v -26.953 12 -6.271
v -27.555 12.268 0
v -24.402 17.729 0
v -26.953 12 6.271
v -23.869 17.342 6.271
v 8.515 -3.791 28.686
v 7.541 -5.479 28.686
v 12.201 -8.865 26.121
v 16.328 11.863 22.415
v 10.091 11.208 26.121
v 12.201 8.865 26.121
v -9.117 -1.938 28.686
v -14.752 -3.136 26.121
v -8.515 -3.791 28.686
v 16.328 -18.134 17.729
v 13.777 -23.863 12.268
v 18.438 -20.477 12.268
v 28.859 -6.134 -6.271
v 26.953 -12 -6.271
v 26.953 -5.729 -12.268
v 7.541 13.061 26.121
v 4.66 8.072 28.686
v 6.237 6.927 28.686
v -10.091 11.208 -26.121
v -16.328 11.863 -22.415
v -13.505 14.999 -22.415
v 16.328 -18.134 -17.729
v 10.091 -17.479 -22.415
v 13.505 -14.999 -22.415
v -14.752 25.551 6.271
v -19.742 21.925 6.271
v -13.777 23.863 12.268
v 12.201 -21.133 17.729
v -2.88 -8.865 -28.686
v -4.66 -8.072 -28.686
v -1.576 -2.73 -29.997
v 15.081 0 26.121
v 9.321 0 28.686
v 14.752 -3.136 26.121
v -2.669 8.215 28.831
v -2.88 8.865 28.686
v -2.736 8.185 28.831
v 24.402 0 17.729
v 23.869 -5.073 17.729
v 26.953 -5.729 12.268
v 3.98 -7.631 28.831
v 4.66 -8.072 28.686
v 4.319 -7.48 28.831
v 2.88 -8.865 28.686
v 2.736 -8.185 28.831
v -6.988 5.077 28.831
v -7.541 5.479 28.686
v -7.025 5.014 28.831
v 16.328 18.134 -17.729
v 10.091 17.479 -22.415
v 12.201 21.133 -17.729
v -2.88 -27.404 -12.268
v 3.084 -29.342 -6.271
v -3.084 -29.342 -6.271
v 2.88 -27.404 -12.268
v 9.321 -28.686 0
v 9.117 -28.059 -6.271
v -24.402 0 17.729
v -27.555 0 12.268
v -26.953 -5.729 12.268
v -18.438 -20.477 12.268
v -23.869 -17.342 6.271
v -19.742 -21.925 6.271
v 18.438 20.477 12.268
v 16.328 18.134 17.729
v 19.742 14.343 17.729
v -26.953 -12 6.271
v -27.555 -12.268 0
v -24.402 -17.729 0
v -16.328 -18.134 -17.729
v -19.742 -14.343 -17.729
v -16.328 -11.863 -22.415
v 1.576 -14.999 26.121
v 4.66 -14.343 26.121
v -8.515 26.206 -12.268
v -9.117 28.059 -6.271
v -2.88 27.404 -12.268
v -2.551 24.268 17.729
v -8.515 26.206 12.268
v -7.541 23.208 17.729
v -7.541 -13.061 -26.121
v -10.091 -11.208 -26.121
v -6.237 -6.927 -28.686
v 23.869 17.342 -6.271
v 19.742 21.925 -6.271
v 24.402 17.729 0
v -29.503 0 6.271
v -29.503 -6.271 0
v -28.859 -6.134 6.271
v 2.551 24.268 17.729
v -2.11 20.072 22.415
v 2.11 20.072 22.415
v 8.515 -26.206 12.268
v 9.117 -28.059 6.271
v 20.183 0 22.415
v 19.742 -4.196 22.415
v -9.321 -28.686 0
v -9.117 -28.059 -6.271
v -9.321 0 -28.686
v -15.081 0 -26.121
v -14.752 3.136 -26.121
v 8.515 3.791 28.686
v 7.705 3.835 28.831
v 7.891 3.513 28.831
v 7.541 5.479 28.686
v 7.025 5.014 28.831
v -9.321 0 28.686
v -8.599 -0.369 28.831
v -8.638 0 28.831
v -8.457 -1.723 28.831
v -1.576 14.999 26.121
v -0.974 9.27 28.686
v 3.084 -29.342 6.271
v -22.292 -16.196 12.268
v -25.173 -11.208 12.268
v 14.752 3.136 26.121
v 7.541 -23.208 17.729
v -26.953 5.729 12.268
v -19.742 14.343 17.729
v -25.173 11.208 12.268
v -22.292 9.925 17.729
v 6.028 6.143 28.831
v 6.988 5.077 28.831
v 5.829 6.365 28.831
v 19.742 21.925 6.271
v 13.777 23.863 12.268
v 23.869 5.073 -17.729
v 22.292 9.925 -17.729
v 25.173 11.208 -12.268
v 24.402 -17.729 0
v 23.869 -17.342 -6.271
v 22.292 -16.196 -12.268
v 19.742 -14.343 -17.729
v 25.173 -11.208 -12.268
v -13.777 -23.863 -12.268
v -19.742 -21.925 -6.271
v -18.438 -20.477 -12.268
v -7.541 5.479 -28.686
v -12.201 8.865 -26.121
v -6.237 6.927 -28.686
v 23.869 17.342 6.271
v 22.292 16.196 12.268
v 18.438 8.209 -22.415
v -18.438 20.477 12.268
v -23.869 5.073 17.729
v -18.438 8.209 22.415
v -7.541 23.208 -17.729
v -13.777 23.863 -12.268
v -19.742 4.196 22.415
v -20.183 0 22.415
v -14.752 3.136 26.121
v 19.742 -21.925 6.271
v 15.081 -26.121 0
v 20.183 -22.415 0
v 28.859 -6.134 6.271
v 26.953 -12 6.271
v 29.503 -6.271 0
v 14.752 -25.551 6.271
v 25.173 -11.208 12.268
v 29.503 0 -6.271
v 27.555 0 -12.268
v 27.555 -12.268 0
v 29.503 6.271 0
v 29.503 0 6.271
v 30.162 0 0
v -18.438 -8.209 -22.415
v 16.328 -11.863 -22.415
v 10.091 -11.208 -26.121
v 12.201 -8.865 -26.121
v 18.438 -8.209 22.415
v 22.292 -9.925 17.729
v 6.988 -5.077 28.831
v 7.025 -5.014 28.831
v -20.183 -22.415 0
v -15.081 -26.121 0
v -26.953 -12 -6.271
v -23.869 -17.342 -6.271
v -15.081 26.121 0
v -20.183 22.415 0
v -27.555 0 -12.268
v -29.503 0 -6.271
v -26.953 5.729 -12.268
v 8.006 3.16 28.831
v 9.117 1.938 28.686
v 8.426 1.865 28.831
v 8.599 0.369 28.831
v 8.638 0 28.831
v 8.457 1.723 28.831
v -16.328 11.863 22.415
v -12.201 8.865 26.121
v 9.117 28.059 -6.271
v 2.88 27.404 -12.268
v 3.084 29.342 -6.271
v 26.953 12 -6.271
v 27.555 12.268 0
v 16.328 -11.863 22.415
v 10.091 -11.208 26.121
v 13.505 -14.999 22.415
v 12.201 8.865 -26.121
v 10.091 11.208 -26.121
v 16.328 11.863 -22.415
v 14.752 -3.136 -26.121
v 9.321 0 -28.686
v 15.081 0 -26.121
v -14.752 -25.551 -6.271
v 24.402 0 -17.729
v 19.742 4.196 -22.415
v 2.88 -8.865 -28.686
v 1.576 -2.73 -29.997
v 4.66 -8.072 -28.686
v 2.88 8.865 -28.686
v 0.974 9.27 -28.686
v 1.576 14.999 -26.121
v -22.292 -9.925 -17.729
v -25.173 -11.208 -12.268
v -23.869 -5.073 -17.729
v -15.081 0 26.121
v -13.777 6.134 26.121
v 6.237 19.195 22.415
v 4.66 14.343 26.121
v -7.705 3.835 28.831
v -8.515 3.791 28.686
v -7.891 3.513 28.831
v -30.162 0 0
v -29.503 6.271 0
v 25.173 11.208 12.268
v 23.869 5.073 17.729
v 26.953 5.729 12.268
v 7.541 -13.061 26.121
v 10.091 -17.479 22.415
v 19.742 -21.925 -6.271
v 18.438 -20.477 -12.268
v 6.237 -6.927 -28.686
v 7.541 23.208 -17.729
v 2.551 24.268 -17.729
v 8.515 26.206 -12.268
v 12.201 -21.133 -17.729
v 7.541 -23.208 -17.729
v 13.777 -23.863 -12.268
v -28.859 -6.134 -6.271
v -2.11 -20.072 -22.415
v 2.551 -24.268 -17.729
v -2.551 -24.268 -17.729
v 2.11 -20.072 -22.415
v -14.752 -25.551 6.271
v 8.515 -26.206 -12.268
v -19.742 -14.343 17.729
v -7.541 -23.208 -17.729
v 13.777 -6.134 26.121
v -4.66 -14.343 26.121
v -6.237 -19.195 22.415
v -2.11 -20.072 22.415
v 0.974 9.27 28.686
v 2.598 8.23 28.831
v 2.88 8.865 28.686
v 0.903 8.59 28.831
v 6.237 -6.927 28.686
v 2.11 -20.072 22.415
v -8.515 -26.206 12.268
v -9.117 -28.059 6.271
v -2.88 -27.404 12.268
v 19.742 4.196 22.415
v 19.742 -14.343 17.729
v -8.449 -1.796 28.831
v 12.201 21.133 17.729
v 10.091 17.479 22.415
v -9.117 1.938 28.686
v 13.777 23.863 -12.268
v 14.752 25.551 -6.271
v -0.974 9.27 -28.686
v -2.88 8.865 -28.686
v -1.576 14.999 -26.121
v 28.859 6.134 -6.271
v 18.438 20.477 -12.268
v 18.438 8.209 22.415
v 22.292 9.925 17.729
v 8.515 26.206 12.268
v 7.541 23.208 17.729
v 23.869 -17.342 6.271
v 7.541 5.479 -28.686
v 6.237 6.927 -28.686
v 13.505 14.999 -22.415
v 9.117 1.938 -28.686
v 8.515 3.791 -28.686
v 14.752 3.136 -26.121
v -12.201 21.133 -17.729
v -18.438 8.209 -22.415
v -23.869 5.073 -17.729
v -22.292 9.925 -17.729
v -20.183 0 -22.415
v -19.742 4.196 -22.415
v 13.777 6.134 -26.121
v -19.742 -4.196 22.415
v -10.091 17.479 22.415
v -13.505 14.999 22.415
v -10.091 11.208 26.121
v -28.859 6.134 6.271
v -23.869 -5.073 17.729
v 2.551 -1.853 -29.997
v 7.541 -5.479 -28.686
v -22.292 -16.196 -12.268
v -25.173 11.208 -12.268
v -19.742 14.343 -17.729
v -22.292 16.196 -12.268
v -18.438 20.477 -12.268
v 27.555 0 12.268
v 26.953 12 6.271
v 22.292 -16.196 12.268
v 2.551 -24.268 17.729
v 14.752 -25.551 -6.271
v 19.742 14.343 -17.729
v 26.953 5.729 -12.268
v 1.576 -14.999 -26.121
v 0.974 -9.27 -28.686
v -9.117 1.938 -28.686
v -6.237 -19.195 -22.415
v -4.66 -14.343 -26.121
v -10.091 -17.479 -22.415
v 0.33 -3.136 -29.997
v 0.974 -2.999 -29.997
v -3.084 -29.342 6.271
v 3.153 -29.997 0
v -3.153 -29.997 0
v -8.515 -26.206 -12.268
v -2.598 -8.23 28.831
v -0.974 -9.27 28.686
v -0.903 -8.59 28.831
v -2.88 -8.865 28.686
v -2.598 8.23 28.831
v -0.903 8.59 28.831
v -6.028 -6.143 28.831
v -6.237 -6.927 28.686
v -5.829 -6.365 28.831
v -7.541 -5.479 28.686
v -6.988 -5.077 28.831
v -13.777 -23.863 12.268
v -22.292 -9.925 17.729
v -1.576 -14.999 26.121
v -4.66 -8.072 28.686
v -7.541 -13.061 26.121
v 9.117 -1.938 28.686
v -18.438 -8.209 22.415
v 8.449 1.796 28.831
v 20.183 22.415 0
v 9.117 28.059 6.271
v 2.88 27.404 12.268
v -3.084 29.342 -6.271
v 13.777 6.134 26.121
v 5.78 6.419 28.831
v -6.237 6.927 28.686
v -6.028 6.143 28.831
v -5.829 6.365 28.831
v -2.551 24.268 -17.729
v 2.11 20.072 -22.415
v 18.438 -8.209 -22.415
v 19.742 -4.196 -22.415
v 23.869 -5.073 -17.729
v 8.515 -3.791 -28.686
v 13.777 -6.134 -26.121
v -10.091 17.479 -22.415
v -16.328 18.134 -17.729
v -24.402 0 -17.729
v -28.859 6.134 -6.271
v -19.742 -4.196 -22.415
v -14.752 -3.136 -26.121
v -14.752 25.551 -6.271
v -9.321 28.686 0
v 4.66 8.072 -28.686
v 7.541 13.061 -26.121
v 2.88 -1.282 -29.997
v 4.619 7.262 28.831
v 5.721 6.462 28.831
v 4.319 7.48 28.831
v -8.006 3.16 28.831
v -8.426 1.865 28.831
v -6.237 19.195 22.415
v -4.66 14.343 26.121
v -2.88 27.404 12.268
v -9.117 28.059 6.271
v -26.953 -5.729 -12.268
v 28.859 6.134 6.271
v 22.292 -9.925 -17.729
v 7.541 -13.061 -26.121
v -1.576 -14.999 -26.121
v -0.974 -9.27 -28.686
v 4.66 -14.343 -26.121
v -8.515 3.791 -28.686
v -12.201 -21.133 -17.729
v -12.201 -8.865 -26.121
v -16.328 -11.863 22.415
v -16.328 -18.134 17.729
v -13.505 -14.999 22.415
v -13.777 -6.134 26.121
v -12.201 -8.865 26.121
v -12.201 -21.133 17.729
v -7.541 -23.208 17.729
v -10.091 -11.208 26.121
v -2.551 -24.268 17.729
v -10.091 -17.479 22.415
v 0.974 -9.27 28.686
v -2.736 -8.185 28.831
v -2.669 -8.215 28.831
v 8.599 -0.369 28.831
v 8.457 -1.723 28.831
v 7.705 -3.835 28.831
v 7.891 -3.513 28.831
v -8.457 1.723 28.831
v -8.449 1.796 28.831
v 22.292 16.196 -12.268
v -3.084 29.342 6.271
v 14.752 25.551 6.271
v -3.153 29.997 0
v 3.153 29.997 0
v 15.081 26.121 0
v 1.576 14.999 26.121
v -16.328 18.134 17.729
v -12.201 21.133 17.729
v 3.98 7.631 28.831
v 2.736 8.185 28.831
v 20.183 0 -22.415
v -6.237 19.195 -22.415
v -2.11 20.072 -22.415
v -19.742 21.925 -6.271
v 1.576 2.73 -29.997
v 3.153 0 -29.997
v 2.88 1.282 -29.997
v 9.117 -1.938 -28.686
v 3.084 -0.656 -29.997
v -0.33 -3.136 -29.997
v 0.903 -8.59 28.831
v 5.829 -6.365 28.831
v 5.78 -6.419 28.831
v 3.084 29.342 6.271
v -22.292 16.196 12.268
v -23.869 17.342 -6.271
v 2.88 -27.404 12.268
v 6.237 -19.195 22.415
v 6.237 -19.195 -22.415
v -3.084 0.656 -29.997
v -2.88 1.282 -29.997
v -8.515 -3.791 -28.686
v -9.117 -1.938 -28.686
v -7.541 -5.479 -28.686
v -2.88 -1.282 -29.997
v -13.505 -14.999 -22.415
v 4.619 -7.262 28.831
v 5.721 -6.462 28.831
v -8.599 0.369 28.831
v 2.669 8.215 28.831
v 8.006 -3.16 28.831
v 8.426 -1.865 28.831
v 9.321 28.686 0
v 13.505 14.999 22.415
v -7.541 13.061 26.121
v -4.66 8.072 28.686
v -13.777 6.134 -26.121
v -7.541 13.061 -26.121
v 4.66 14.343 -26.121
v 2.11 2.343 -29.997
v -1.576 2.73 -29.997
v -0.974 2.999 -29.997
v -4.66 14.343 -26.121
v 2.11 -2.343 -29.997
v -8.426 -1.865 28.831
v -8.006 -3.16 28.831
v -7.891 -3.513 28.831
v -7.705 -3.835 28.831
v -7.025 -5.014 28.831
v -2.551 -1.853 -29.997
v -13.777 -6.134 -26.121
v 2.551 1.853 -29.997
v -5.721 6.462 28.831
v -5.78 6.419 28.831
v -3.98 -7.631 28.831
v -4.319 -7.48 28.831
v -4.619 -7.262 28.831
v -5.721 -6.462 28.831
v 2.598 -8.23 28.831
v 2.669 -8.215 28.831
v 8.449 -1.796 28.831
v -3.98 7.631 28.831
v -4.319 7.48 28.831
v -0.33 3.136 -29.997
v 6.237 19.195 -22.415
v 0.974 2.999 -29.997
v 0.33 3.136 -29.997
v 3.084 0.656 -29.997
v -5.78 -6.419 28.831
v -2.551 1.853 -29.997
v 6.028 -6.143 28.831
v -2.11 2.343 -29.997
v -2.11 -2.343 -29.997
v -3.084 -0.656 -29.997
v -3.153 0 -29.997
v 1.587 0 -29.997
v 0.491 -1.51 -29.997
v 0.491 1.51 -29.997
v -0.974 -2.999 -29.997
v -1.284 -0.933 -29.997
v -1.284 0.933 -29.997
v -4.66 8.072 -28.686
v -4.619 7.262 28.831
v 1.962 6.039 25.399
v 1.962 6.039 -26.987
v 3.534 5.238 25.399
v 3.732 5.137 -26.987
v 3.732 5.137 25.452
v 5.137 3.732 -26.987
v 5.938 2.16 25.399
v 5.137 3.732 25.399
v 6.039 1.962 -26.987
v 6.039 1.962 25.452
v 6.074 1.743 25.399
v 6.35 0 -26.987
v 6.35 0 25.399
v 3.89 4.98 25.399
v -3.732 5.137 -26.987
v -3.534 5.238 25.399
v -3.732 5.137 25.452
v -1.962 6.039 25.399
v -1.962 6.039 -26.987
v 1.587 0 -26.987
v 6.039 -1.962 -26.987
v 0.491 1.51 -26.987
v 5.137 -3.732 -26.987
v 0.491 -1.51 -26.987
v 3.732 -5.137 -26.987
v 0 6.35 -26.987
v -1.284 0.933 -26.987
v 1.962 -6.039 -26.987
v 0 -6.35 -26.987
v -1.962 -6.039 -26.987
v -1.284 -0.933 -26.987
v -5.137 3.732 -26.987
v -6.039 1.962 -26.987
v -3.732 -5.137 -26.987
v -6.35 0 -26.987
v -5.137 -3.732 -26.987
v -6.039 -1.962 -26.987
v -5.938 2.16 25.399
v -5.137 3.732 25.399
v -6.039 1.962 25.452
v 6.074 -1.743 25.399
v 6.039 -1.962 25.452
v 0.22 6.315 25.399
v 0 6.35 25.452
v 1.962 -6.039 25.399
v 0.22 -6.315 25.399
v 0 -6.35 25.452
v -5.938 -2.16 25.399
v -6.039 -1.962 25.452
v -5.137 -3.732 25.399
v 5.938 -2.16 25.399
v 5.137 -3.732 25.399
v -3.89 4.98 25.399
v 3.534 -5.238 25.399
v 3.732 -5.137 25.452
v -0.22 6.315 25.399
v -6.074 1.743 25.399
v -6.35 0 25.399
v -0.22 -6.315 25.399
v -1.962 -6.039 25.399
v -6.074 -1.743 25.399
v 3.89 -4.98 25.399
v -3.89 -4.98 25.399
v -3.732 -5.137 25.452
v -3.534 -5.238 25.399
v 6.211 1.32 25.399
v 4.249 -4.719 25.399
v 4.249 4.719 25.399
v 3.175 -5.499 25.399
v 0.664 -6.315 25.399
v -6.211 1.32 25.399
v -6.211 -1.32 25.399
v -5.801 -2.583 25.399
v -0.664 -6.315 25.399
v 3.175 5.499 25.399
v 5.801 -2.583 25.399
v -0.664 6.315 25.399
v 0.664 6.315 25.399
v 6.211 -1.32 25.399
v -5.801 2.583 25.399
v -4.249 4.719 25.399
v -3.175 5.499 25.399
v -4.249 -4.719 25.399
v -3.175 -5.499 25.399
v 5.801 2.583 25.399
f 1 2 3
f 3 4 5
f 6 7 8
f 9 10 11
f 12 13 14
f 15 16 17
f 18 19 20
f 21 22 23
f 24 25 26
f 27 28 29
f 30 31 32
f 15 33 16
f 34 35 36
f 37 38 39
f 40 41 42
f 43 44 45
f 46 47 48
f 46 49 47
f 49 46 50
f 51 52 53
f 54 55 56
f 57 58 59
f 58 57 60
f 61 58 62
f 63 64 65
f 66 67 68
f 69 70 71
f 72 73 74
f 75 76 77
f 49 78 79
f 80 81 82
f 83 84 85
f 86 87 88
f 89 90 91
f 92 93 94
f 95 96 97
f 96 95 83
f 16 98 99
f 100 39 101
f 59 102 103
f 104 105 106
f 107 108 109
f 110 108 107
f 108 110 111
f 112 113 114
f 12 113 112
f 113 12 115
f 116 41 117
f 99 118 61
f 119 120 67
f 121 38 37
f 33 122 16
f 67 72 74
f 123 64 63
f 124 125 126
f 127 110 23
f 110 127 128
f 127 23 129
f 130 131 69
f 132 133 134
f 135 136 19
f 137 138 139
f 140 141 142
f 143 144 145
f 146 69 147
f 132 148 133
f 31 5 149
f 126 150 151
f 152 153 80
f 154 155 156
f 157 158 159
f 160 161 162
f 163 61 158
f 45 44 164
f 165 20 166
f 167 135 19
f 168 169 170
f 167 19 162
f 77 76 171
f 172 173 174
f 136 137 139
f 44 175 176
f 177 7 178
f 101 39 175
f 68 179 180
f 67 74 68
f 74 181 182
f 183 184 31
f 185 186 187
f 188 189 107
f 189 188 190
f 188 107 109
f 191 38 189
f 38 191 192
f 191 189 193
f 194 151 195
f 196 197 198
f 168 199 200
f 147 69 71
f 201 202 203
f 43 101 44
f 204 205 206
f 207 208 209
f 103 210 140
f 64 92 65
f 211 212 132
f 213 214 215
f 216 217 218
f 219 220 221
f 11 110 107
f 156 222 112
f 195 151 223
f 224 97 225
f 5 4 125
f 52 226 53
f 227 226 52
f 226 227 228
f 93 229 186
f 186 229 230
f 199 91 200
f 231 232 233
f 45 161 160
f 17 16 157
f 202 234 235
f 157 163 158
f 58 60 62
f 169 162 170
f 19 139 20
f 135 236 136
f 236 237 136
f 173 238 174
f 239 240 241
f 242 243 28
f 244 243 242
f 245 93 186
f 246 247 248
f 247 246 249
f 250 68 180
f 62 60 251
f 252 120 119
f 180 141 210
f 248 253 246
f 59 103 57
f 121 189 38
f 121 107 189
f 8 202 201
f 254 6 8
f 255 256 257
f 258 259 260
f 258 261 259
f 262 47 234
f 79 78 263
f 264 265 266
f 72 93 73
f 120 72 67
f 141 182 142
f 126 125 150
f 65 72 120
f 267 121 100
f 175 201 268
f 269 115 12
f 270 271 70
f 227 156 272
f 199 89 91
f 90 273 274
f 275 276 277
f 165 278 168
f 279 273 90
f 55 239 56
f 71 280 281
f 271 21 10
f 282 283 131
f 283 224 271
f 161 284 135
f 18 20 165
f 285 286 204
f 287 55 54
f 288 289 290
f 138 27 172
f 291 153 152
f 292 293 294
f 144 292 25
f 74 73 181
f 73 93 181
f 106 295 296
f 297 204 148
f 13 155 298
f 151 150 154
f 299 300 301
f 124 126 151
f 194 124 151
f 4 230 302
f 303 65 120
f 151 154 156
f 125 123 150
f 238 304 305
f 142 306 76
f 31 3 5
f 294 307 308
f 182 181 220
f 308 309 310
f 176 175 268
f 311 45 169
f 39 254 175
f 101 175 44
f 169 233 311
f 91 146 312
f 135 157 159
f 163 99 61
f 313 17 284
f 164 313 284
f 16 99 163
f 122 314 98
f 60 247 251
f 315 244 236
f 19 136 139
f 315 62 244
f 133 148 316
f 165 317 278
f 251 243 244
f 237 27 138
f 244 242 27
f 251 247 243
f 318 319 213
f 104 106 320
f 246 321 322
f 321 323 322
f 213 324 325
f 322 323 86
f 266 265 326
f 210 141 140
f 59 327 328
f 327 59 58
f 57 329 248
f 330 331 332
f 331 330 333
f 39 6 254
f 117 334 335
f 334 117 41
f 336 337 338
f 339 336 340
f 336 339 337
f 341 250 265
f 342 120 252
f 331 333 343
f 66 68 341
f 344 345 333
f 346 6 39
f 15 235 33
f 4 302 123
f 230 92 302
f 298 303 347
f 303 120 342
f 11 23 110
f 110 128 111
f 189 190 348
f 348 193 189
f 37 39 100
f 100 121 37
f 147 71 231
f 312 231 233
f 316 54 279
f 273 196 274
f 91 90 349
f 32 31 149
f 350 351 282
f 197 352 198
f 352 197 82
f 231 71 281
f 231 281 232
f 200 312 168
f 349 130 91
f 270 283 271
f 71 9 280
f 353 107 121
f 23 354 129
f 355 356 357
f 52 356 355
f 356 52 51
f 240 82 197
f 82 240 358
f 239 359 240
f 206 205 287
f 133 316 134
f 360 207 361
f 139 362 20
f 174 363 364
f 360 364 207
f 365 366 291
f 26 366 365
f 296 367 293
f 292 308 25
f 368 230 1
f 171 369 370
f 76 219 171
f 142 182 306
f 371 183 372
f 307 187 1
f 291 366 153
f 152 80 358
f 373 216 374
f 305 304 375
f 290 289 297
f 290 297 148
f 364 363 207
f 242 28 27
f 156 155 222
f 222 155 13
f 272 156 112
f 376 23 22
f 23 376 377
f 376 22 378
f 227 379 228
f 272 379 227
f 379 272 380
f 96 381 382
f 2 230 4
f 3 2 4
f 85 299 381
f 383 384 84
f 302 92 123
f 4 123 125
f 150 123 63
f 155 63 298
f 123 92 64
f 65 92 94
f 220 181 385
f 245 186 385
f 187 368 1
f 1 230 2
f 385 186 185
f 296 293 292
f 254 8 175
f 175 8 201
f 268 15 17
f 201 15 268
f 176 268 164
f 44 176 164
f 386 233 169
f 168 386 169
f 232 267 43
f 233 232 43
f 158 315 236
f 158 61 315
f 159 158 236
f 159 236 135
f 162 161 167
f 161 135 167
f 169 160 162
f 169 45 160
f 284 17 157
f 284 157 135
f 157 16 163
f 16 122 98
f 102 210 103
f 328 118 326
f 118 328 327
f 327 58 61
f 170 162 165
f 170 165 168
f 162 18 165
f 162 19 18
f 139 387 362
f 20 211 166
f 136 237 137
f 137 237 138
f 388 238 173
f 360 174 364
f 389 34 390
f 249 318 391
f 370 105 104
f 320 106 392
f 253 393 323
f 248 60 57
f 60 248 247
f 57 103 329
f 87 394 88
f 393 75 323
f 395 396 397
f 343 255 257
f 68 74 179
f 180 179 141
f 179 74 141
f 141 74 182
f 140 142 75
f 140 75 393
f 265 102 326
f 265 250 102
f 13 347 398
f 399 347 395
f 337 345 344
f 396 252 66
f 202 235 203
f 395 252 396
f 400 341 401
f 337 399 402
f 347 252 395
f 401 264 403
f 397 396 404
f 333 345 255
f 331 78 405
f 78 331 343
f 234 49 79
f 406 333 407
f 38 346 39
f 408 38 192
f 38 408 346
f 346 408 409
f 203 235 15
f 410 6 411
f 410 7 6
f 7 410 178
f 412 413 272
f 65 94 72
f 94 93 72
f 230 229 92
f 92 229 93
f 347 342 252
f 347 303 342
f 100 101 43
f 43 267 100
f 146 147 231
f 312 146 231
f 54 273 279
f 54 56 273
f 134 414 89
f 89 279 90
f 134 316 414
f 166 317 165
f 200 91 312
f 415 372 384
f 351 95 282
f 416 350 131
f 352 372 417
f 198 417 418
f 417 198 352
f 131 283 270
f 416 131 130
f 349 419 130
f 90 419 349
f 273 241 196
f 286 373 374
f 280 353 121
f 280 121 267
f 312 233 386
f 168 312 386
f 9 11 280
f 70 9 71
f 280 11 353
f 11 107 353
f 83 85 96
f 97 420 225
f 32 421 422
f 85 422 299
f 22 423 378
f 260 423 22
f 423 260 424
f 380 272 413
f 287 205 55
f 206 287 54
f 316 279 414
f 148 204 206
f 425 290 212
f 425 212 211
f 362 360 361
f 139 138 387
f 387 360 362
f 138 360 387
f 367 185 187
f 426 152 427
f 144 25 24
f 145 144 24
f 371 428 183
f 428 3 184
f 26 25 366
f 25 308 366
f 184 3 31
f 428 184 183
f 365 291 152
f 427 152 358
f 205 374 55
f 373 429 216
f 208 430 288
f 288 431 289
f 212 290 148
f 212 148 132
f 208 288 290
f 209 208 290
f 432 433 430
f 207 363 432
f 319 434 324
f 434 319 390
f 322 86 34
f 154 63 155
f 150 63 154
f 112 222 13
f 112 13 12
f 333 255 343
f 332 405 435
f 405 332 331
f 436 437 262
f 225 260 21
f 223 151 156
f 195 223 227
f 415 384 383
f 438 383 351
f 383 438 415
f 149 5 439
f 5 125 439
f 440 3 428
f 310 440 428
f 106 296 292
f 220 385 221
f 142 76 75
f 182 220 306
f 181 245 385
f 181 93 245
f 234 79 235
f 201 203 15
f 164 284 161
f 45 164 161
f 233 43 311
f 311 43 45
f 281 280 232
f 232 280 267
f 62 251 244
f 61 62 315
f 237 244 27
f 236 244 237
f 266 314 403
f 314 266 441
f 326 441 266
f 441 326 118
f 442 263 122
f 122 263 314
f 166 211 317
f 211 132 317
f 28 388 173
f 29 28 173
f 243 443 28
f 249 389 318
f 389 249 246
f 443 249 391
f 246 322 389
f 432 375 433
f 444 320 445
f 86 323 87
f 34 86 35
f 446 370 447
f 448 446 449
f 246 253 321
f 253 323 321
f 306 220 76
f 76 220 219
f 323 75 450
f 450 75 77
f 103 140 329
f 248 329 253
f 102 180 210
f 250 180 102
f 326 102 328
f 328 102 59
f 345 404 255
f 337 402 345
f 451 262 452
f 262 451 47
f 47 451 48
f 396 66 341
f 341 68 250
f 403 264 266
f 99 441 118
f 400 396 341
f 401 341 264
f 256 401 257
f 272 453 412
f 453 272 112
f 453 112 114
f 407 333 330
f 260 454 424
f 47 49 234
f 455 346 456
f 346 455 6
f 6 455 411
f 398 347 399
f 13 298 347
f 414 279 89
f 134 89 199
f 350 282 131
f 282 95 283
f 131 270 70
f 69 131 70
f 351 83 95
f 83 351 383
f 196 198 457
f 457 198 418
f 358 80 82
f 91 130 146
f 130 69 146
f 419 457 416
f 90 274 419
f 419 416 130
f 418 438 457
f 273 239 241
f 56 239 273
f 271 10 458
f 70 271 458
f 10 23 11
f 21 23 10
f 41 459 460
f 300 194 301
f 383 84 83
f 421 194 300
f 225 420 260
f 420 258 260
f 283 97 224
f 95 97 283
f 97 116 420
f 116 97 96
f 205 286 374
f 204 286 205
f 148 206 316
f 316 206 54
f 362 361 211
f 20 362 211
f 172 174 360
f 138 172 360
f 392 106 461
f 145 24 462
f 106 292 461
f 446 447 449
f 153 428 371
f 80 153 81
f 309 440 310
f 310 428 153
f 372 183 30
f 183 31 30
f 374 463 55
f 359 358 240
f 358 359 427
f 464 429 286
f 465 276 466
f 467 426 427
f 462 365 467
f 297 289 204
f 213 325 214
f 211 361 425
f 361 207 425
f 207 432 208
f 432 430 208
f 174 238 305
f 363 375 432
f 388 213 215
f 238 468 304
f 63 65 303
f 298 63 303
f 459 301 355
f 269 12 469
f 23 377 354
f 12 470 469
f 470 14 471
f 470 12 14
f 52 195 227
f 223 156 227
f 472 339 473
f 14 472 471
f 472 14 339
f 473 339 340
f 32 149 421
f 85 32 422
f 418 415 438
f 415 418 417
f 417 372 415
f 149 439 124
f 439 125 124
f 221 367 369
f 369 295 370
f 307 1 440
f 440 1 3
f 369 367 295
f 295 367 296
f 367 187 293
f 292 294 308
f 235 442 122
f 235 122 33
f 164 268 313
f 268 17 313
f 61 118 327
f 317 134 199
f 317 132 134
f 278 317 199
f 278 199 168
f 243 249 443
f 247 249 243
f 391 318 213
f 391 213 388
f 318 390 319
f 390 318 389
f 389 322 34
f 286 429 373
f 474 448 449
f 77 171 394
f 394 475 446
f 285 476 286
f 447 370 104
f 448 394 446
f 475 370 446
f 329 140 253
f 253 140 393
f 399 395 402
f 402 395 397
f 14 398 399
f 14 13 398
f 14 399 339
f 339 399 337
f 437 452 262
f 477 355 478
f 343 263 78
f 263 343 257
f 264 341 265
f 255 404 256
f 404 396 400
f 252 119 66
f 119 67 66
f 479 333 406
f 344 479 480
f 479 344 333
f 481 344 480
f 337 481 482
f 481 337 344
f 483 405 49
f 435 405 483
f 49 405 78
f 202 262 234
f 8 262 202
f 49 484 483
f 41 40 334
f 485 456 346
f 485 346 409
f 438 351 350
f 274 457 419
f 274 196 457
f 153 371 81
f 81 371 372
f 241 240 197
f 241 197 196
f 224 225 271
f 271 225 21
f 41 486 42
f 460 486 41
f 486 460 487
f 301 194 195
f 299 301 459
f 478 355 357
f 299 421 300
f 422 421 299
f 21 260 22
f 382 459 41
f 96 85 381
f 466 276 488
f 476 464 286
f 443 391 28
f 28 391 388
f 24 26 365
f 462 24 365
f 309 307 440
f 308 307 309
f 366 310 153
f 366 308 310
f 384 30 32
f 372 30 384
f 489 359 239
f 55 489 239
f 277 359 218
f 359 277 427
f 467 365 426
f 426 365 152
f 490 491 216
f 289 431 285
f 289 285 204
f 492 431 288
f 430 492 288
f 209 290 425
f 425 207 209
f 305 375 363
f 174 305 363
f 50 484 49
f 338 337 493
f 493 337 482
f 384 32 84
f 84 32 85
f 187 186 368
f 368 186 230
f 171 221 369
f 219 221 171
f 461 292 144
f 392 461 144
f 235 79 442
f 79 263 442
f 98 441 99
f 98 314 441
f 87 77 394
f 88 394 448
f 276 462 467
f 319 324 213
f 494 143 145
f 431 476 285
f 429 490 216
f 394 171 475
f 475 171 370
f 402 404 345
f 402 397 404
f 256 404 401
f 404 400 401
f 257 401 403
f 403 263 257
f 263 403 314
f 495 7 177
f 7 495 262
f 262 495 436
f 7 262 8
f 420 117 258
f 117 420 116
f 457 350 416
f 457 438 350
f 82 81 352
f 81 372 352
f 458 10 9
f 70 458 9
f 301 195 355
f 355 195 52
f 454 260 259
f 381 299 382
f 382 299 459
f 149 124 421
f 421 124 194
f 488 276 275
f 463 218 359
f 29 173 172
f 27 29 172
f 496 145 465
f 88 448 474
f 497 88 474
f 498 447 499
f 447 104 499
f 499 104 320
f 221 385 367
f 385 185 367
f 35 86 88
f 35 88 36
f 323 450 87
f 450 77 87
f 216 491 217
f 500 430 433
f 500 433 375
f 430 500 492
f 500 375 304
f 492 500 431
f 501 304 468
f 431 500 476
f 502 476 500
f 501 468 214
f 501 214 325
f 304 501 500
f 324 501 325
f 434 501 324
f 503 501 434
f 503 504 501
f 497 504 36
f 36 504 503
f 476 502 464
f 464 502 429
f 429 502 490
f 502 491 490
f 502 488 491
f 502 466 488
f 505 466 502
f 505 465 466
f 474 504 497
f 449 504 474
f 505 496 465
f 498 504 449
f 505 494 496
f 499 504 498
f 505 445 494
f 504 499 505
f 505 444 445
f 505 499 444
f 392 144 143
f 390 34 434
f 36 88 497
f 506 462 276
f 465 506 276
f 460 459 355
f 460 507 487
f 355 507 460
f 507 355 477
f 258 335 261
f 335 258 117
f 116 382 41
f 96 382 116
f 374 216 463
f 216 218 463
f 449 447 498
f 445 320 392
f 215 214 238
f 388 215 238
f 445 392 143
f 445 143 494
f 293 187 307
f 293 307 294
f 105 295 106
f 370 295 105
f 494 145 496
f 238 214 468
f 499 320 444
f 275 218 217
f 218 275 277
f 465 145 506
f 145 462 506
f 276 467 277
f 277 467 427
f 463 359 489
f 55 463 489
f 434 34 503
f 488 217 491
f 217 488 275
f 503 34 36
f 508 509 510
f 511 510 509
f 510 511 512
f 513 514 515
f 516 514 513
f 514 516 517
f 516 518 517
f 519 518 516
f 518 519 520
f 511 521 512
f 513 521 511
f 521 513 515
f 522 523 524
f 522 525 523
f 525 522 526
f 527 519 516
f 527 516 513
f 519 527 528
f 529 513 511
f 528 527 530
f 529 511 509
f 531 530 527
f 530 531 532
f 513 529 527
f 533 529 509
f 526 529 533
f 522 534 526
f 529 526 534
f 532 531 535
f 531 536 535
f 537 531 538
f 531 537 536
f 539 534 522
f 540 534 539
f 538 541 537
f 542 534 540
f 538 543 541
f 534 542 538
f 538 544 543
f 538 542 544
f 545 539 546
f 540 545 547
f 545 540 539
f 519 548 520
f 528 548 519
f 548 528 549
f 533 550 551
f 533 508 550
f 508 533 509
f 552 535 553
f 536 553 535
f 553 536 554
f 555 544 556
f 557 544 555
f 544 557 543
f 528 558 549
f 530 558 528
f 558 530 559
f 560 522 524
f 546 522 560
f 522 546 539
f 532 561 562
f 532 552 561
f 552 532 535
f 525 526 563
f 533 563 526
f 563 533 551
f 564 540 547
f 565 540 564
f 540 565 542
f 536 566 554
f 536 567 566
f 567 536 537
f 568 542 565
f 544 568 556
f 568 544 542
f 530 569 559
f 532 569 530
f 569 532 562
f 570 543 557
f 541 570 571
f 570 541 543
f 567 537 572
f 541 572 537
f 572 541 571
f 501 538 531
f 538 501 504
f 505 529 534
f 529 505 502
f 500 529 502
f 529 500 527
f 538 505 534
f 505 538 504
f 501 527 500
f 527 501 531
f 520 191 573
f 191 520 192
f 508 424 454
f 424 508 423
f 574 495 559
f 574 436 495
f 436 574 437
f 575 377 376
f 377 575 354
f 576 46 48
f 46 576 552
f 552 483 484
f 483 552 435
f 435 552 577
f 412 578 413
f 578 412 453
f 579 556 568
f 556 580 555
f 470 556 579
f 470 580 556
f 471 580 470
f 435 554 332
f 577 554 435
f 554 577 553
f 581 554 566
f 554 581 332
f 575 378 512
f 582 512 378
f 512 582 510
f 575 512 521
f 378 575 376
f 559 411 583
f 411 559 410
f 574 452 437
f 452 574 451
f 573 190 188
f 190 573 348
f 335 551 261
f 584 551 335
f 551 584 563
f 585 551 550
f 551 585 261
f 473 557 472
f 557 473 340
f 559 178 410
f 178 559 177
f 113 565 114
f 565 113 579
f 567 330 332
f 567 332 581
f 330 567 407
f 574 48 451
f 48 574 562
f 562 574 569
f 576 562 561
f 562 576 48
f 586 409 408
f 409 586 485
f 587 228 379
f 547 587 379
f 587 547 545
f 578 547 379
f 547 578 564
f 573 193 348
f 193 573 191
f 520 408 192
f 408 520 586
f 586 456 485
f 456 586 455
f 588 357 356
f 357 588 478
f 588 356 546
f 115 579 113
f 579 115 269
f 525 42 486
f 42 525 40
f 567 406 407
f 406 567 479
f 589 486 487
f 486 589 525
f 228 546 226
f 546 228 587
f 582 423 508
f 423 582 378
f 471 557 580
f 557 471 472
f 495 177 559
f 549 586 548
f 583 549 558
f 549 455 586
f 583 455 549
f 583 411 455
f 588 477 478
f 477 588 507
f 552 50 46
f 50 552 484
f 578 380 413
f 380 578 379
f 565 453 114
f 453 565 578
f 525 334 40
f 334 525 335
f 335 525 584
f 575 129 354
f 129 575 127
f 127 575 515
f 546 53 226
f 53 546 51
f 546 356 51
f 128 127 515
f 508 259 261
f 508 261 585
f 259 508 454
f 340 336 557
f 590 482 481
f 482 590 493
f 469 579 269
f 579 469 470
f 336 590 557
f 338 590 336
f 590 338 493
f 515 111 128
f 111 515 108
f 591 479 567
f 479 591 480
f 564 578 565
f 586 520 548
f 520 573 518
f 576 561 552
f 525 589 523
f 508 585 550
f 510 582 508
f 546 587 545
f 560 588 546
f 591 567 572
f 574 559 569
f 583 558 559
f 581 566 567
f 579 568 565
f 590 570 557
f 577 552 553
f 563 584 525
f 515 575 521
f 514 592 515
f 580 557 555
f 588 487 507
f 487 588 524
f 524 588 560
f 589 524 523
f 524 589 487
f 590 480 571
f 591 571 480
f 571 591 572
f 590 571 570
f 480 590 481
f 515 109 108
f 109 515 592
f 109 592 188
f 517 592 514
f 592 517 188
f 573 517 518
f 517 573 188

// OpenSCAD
//ball module
module tama(){
    
    // radius of the ball
    radius = 60.325/2;
    difference(){
        sphere(radius);
        translate([0,0,-26.9875]) cylinder(h = 60.325, r = 12.7/2);
        translate([0,0,-35]) cylinder(h = 70, r = 3.175/2);
        
        translate([0,0, 25.3995]) cylinder(h = 4.763, r1 = 12.7/2, r2 = 19.05/2);
    }
}


tama();
